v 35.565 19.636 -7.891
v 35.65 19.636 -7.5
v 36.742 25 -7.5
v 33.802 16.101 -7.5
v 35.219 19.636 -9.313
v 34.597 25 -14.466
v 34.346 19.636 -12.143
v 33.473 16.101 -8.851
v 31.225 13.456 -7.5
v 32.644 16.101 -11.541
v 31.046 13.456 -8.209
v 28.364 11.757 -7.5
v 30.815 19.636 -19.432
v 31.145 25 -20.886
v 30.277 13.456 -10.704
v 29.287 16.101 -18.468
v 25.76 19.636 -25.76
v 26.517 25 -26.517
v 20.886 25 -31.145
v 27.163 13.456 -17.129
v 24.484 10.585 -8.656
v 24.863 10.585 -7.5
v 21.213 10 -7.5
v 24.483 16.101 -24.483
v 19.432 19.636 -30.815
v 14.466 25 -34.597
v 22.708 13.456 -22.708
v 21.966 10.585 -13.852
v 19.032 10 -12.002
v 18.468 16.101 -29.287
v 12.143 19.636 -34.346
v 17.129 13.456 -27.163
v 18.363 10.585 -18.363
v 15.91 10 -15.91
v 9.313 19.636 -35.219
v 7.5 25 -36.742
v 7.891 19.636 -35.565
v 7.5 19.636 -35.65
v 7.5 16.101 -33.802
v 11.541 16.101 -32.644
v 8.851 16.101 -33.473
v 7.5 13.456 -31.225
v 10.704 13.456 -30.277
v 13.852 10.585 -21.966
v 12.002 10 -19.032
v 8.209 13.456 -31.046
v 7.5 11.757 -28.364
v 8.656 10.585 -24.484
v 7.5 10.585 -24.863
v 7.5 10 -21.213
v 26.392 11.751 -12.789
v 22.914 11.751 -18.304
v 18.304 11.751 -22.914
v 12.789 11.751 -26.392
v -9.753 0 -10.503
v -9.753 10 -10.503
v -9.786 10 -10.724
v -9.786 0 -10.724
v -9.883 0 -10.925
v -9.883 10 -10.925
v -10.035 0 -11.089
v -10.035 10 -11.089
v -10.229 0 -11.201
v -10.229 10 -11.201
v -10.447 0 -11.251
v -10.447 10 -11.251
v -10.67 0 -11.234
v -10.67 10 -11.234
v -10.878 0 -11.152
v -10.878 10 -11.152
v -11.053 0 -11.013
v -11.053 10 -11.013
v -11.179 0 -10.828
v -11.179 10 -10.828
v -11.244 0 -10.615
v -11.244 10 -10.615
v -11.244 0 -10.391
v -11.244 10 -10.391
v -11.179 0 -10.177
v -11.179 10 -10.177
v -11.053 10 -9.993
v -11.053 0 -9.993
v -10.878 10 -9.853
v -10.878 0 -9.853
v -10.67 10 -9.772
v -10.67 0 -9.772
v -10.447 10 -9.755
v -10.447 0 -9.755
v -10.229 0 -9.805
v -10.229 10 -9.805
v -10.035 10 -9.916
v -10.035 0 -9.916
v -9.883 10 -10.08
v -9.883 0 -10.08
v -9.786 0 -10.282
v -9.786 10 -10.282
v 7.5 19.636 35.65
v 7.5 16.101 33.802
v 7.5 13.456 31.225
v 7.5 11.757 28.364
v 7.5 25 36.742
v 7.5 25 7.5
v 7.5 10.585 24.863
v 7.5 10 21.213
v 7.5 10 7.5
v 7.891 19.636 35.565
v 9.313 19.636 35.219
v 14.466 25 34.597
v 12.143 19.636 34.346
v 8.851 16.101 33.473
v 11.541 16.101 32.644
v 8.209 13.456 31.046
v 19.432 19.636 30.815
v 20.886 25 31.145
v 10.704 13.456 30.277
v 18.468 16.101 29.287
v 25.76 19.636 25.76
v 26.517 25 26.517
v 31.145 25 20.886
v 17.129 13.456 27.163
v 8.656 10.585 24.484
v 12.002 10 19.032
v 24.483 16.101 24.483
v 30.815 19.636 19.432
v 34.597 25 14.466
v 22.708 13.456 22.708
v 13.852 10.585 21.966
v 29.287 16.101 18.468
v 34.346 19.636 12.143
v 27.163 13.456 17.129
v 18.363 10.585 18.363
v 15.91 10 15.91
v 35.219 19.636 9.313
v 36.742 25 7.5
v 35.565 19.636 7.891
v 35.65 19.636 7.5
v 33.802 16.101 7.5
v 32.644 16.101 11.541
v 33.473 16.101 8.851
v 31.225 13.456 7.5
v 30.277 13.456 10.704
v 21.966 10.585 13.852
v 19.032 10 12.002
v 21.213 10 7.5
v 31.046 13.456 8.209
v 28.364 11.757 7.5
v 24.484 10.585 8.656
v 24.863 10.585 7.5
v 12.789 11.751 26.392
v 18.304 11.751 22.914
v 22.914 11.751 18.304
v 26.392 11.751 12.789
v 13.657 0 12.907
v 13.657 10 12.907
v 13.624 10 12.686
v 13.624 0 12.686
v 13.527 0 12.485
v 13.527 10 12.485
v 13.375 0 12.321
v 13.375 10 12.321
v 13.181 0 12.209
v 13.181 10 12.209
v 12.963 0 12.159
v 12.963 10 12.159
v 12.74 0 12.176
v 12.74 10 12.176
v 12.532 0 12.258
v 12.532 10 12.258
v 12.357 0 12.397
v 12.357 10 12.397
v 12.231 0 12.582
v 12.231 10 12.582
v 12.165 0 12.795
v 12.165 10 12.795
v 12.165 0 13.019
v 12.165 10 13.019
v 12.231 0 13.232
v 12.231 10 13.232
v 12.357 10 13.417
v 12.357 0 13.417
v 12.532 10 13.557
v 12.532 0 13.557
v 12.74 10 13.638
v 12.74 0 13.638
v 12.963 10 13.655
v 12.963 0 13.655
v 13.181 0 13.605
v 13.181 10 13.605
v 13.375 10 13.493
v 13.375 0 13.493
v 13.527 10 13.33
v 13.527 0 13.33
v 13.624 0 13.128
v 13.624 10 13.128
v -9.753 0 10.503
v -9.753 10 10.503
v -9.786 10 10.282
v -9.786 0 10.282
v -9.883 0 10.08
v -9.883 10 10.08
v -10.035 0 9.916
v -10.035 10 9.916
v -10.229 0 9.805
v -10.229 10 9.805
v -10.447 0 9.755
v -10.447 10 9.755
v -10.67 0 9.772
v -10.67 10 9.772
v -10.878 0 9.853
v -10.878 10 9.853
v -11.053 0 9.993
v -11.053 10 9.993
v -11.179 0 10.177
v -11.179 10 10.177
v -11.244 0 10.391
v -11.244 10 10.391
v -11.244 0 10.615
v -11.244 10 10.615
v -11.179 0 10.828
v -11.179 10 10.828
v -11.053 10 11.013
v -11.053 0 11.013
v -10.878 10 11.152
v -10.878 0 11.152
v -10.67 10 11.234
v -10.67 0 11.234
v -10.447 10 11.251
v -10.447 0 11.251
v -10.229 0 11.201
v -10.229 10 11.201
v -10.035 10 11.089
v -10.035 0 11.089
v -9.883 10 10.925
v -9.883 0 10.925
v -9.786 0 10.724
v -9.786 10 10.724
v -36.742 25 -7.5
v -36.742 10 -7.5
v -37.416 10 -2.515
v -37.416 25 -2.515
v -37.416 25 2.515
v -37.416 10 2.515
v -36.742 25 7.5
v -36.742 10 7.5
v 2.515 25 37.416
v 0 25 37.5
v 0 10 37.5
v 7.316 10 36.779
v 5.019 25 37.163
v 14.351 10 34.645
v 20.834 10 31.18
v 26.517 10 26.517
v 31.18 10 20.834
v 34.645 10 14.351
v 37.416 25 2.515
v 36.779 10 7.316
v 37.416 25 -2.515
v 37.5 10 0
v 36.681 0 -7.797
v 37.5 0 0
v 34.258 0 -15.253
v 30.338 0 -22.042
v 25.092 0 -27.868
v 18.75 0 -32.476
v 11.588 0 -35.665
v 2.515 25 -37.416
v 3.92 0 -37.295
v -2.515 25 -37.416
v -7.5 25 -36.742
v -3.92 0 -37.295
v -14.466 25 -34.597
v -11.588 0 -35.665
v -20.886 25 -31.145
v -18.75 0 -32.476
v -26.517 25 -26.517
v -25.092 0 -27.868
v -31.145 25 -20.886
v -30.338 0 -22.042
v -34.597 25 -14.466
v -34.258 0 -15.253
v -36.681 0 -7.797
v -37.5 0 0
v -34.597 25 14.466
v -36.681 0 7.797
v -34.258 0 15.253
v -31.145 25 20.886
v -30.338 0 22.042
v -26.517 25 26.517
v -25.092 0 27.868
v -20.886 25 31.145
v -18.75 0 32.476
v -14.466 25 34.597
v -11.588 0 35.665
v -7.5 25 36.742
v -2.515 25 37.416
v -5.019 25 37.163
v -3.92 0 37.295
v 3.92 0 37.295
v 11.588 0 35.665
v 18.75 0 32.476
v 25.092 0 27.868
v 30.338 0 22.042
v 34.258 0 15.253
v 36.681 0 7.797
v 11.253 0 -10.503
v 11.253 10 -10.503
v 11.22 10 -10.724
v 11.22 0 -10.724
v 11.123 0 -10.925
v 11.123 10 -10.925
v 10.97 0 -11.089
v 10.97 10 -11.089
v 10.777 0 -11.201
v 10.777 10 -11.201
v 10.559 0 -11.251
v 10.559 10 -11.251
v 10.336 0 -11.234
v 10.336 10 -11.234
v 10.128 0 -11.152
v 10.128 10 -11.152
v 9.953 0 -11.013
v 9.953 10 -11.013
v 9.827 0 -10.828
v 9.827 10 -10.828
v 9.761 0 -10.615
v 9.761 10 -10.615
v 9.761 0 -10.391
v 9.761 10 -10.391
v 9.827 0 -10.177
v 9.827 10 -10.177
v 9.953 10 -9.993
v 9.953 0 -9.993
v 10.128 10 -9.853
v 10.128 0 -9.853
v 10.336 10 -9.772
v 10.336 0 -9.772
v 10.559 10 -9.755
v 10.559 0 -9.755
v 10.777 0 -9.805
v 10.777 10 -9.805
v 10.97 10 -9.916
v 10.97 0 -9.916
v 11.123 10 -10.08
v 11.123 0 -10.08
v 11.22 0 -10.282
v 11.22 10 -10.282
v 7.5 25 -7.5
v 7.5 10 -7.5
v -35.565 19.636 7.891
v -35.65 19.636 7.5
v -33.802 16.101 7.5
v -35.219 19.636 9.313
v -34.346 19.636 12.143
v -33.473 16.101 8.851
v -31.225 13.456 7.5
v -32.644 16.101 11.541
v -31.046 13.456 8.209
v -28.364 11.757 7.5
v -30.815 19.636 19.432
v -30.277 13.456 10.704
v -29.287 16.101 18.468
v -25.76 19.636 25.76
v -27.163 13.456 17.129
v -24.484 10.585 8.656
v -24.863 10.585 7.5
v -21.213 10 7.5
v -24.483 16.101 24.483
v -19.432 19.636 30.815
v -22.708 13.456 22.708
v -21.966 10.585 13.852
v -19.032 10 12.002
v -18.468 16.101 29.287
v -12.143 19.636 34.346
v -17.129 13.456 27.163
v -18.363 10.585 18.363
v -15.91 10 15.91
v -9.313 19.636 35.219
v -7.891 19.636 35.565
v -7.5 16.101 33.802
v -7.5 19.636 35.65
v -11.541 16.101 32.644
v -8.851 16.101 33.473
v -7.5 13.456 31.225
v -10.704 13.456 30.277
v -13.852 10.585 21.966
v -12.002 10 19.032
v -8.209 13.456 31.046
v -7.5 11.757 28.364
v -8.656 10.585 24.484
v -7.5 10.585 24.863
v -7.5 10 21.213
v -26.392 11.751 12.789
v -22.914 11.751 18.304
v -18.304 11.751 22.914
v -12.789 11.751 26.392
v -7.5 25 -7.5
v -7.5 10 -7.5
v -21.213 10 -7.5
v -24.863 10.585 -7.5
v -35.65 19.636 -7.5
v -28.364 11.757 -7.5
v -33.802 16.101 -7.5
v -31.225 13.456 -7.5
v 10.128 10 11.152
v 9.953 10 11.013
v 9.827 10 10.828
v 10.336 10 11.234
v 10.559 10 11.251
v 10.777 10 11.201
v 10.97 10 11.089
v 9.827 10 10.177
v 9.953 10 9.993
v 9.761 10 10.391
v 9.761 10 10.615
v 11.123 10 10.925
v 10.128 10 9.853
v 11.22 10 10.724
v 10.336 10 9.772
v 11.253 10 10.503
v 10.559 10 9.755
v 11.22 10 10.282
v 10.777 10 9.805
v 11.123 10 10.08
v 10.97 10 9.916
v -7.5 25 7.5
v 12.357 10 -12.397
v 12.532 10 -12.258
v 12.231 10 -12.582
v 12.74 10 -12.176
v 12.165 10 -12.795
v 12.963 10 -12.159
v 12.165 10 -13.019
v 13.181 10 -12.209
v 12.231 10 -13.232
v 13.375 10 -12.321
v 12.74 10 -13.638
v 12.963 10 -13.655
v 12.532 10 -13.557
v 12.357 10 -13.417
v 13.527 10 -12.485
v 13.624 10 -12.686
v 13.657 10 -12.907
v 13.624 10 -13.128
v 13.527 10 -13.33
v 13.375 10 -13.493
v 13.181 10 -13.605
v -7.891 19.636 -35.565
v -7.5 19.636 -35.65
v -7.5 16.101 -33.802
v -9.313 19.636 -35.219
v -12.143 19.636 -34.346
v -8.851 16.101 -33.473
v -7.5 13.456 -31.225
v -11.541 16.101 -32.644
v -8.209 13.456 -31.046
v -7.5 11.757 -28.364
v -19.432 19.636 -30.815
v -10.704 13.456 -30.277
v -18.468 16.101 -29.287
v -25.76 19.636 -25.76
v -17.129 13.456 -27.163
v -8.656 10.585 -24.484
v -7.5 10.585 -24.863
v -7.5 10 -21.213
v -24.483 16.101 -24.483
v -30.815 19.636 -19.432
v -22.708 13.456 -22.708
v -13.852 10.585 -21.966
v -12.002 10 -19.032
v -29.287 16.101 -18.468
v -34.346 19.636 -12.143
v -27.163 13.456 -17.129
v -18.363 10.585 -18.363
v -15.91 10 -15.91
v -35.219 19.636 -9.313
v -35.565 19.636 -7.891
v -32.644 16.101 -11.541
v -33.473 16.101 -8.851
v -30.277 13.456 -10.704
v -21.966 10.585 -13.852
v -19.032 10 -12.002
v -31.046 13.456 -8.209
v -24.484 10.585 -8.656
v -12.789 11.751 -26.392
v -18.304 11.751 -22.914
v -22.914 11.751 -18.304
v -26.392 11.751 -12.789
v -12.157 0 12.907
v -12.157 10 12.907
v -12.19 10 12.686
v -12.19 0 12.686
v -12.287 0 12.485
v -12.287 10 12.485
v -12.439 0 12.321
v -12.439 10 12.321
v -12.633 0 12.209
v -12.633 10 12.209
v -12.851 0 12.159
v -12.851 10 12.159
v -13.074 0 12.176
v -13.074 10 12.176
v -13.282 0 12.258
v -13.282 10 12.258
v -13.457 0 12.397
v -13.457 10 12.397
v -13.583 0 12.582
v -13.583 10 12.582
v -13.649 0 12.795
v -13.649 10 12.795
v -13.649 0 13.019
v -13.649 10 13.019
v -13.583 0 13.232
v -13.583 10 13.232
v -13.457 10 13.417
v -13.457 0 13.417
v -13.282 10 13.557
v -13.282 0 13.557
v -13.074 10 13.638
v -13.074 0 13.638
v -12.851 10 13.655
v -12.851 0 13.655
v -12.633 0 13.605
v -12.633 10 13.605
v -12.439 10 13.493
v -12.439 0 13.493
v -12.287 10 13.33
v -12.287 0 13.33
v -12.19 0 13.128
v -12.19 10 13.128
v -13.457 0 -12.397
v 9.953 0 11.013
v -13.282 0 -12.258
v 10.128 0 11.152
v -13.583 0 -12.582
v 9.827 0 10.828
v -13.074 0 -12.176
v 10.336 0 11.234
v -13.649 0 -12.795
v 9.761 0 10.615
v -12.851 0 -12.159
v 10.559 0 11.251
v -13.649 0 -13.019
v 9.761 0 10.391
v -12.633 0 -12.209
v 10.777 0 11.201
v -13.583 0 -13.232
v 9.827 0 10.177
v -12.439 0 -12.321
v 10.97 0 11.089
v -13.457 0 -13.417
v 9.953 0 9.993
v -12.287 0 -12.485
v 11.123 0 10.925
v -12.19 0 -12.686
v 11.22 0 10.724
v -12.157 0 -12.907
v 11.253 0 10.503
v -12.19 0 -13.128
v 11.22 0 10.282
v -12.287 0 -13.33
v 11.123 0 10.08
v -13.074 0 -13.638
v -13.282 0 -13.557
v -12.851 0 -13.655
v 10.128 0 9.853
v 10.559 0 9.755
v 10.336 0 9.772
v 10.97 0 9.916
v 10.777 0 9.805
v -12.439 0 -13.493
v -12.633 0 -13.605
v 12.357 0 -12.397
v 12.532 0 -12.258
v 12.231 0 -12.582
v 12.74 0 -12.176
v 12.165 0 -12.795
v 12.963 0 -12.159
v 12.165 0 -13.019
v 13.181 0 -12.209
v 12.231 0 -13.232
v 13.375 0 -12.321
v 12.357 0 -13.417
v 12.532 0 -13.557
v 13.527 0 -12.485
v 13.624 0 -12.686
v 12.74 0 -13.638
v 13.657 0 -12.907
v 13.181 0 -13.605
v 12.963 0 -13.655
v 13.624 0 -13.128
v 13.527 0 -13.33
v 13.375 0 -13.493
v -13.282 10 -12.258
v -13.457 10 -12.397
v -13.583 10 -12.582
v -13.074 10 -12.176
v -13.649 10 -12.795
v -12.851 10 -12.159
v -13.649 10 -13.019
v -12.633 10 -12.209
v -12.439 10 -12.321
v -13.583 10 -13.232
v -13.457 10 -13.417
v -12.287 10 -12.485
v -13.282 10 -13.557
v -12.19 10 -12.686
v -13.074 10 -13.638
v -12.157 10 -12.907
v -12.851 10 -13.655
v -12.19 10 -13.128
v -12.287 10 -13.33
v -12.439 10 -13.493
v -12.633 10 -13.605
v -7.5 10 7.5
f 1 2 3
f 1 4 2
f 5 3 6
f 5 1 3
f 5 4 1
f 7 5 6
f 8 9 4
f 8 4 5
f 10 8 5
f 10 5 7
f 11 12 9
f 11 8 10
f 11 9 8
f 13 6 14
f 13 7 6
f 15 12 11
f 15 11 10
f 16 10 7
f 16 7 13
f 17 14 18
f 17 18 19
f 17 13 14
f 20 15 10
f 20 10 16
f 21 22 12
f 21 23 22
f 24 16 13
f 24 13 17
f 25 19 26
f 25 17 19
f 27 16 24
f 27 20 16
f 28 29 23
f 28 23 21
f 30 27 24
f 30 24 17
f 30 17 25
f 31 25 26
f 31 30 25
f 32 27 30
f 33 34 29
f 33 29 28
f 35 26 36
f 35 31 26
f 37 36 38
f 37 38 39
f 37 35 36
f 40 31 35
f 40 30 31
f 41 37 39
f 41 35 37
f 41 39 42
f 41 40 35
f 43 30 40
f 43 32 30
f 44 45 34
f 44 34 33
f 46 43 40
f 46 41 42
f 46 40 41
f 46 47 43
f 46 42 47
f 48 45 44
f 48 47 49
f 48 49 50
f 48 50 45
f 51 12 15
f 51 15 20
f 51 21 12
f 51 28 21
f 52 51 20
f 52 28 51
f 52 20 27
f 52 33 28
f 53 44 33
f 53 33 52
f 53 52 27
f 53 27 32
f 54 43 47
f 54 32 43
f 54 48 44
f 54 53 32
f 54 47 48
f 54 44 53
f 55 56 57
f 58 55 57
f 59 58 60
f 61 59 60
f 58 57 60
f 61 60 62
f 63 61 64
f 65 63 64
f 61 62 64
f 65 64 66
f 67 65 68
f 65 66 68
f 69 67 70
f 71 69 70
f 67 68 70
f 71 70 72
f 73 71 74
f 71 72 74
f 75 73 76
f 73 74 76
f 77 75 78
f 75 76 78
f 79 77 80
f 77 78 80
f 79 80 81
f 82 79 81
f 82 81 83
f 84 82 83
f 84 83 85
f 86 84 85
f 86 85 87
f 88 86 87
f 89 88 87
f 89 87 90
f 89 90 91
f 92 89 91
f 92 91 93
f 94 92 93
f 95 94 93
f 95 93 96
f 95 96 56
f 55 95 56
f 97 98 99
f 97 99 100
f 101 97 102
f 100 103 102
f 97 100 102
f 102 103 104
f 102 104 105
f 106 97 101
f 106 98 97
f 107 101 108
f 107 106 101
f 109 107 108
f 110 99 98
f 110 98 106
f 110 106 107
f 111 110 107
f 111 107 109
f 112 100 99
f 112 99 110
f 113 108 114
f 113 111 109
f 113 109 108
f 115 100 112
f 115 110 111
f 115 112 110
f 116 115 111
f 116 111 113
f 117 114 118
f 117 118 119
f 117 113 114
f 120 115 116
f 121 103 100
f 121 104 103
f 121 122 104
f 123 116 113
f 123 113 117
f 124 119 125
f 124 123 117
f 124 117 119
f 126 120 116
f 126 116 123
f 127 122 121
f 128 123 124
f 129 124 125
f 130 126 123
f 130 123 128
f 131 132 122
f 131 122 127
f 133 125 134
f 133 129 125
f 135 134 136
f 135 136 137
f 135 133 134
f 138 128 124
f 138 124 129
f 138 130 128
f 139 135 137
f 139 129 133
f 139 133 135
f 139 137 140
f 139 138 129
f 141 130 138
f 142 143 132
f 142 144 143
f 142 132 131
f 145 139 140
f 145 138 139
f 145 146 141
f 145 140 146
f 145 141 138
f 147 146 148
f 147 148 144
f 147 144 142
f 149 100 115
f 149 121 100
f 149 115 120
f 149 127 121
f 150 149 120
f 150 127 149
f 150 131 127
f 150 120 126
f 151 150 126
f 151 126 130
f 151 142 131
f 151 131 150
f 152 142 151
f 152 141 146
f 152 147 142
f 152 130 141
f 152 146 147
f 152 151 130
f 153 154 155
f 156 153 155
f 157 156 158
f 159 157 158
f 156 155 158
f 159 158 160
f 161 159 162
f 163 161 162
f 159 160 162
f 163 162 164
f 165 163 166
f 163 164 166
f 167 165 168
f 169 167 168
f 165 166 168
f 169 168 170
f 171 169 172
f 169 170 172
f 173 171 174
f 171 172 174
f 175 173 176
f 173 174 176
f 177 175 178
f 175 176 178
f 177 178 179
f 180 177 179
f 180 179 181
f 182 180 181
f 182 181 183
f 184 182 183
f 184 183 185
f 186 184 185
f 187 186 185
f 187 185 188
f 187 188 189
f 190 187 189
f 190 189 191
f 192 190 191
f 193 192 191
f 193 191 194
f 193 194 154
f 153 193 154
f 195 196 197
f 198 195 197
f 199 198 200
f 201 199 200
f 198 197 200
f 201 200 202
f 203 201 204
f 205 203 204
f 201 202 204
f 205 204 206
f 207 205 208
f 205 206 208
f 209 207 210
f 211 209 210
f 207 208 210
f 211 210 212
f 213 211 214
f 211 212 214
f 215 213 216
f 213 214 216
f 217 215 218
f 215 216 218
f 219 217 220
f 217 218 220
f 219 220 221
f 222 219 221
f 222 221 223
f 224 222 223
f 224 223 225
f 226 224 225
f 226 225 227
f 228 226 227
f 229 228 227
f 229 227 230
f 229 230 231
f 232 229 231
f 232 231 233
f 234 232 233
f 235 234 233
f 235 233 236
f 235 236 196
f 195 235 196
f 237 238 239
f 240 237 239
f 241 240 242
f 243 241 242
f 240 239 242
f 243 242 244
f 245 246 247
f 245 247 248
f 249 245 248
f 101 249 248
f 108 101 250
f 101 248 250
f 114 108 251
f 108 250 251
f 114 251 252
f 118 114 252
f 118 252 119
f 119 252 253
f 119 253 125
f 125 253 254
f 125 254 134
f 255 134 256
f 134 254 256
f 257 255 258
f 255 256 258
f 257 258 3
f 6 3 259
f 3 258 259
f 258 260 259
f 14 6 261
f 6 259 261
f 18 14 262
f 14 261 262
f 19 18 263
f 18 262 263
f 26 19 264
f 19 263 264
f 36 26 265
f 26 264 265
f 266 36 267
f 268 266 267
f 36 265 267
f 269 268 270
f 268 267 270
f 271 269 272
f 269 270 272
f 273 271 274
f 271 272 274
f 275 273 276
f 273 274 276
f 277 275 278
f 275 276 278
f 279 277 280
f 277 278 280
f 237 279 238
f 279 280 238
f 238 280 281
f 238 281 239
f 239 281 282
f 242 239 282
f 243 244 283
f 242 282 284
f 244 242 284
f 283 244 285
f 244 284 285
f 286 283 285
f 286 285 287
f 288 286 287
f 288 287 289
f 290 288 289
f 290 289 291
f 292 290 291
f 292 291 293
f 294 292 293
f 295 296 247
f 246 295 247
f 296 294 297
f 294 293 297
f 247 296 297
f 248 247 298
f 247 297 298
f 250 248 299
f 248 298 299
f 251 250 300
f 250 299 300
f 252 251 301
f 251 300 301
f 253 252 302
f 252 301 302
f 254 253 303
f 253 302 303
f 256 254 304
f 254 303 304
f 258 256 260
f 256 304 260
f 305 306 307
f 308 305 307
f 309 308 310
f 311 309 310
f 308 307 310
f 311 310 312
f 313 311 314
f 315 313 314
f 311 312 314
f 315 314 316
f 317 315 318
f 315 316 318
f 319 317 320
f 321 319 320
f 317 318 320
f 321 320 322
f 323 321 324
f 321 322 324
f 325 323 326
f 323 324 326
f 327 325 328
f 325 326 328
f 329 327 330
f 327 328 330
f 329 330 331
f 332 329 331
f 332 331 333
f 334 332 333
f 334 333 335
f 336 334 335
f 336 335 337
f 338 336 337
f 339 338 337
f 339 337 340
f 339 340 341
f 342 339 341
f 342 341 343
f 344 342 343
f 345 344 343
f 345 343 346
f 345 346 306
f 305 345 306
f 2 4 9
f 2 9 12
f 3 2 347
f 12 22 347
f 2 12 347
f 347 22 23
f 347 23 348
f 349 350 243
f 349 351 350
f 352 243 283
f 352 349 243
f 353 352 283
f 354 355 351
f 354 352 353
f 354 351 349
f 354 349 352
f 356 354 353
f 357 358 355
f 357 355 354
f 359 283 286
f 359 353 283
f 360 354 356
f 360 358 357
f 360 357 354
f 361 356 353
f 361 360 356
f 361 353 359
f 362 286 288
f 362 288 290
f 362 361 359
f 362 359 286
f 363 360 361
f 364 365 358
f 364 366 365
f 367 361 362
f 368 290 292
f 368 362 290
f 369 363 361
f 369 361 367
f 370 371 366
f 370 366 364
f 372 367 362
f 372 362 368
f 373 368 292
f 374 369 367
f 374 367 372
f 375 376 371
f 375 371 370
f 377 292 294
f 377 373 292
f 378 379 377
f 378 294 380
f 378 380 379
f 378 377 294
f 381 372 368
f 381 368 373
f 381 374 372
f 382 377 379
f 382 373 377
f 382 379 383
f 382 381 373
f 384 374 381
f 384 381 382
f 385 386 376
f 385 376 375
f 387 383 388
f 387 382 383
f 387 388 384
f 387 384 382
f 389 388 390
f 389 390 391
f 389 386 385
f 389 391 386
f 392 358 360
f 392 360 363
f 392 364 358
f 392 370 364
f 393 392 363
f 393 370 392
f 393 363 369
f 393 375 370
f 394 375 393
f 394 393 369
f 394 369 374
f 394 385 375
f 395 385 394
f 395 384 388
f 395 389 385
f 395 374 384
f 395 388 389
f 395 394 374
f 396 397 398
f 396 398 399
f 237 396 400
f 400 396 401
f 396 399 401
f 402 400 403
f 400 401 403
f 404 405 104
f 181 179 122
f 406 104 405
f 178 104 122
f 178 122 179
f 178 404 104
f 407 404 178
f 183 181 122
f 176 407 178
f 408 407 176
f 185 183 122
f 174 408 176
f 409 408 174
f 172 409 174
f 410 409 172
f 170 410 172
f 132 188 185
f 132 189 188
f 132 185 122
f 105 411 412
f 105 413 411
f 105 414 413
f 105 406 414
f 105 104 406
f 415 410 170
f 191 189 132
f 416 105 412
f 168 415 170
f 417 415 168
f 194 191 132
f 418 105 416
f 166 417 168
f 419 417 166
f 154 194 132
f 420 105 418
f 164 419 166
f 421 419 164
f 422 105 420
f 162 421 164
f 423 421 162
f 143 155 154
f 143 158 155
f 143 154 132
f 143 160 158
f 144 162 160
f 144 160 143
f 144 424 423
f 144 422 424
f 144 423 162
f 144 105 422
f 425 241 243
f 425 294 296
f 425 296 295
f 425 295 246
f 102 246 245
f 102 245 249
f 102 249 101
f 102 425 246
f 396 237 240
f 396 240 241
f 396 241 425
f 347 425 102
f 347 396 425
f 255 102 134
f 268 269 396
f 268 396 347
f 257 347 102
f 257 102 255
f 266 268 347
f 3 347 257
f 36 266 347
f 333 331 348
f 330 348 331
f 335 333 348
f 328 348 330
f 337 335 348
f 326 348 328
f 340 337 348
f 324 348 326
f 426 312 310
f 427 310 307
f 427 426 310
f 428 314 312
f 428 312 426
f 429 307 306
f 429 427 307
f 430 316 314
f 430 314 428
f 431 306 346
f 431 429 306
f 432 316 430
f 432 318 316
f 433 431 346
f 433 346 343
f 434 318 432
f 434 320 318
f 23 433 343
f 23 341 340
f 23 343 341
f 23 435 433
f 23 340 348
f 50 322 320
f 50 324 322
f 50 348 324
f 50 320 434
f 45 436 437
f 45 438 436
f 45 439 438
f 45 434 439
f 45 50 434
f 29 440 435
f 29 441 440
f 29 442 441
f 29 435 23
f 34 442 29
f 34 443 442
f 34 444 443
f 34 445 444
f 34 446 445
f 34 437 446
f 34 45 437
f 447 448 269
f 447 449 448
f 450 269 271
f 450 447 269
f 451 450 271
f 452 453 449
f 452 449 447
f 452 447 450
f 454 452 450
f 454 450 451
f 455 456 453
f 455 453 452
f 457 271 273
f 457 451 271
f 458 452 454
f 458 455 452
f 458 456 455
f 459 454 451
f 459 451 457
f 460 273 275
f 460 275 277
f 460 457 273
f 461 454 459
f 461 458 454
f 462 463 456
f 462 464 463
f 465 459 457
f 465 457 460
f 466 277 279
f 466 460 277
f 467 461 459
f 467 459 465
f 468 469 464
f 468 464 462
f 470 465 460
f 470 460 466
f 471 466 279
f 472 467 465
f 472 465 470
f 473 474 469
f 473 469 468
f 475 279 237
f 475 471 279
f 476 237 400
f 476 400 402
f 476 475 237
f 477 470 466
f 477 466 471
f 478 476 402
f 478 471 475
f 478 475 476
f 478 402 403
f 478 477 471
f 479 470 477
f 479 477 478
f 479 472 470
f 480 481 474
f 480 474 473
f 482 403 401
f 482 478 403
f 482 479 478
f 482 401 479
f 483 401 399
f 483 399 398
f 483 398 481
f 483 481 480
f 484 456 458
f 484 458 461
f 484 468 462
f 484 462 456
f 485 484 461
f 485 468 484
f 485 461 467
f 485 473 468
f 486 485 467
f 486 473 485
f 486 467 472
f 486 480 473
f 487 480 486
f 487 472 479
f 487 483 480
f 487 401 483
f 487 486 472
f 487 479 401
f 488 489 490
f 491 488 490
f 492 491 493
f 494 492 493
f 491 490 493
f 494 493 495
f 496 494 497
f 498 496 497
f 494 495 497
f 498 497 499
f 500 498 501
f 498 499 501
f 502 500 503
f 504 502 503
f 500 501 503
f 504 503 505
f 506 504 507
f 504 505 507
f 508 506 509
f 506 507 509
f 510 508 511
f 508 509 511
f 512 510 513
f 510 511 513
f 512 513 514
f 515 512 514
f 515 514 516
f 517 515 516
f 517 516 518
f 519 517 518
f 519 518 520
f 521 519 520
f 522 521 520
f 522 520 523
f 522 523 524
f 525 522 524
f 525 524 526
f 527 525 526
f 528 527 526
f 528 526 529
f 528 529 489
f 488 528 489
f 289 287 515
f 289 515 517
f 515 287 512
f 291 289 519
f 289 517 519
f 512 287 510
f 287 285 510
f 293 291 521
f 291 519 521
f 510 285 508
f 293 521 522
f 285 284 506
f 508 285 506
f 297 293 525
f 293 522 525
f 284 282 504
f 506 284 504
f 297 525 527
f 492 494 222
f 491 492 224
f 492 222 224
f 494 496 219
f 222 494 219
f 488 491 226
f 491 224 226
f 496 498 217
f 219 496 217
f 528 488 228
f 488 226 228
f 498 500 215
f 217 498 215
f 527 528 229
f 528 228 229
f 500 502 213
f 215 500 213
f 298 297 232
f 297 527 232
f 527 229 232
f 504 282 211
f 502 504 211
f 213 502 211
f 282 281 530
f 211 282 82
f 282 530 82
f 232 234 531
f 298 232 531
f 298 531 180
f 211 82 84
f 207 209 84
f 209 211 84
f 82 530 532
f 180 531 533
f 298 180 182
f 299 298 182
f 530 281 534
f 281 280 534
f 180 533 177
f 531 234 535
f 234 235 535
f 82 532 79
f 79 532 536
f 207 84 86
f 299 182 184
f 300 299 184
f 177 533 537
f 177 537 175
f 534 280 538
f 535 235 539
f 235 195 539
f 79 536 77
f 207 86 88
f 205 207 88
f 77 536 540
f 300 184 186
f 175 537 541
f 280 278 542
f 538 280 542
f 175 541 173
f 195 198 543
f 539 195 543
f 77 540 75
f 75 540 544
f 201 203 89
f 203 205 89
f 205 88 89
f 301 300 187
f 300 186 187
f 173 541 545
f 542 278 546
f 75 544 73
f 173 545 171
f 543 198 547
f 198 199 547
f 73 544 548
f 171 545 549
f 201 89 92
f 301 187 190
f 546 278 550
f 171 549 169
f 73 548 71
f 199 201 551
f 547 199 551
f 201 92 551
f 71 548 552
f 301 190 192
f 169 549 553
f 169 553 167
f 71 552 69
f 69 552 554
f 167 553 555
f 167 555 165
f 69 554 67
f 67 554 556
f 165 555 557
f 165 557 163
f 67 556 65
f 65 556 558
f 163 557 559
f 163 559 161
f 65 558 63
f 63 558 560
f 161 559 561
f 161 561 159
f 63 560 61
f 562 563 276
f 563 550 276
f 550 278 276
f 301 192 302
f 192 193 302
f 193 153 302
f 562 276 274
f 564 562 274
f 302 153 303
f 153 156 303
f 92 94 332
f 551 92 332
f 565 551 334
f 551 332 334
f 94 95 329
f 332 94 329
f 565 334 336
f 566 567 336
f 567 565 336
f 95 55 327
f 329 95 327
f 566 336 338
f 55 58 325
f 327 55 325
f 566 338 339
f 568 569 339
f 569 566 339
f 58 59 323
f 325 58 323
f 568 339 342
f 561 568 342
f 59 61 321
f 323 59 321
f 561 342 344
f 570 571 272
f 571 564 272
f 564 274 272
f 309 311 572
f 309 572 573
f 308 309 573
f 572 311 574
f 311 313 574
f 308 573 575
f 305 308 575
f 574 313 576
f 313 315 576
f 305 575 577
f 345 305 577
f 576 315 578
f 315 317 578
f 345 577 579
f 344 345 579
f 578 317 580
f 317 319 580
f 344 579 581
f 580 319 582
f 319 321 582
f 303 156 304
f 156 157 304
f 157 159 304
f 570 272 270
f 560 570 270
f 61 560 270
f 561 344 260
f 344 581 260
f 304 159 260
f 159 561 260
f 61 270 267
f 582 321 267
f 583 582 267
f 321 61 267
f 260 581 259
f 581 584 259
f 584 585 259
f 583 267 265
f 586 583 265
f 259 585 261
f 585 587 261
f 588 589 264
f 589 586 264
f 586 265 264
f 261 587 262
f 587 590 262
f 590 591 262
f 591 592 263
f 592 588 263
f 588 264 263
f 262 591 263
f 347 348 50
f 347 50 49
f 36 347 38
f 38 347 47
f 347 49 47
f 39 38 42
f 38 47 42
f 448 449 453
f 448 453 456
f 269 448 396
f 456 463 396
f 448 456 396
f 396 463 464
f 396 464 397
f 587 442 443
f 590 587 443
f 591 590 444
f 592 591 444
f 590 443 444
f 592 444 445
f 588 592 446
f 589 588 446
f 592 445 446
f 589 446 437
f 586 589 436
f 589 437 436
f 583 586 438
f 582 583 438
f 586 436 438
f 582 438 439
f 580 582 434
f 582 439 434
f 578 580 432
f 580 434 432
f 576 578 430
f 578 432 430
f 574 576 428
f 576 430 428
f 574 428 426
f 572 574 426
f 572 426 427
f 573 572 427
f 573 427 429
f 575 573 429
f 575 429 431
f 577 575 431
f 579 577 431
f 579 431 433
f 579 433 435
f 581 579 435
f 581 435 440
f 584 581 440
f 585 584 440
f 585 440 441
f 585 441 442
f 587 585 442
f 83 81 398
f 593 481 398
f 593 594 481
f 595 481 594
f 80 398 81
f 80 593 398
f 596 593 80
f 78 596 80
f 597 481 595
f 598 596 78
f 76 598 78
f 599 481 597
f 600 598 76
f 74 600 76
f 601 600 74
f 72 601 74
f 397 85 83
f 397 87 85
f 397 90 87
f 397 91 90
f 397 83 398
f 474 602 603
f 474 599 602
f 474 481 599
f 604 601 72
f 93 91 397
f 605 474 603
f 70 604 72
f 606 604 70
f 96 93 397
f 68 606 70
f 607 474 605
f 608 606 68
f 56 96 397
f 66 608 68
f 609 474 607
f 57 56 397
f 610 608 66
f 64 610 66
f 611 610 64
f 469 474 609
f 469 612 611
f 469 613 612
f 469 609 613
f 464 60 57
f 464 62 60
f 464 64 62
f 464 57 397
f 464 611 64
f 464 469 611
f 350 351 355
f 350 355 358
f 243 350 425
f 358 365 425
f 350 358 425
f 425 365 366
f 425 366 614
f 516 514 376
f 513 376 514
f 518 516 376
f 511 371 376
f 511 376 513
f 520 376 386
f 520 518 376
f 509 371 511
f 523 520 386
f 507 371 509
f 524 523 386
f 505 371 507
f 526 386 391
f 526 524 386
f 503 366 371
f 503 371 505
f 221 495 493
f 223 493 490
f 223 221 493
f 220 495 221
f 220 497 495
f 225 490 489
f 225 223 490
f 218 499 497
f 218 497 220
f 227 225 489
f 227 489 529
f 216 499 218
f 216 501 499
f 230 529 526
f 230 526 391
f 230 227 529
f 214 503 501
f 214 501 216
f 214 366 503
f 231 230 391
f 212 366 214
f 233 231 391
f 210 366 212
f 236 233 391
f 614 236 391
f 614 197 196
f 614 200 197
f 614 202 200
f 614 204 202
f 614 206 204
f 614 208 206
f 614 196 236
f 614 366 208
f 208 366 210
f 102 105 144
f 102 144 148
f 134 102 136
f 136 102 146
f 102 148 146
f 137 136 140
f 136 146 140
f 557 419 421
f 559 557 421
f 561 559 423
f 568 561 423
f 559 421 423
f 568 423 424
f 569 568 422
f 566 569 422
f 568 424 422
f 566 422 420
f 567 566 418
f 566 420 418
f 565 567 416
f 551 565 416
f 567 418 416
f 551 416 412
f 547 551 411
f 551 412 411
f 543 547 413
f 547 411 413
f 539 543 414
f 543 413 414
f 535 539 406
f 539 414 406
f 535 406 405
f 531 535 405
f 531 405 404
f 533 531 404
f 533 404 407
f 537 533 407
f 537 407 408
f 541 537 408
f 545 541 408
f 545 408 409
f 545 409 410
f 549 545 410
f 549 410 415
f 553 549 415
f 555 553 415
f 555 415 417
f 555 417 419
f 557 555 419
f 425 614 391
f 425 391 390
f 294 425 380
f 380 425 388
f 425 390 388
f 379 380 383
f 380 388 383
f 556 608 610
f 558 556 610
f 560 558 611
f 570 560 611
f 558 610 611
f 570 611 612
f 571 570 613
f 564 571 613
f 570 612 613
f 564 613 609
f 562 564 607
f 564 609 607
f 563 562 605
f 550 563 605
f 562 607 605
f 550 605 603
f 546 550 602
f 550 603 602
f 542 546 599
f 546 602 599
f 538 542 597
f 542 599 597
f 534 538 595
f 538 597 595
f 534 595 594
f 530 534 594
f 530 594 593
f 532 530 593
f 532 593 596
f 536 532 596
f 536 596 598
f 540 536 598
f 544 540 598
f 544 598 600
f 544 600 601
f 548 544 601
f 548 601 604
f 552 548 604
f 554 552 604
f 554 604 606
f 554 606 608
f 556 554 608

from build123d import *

# Parameters (mm, degrees)
SKETCH1_R           = 37.5
BOSS_EXTRUDE1_DEPTH = 10
BOSS_EXTRUDE2_DEPTH = 15
SKETCH8_R           = 0.75
CUT_EXTRUDE1_DEPTH  = 11


with BuildPart() as part:
    # Sketch1 → Boss-Extrude1 (new body)
    with BuildSketch(Plane(origin=(0, 0, 0), x_dir=(1, 0, 0), z_dir=(0, 1, 0))):
        Circle(SKETCH1_R)
    extrude(amount=BOSS_EXTRUDE1_DEPTH)

    # Sketch5 → Revolve1 (revolve)
    with BuildSketch(Plane(origin=(0, 0, 0), x_dir=(0, 0, -1), z_dir=(1, 0, 0))):
        with BuildLine():
            Line((-37.5, 25), (-37.5, 10))
            Line((-37.5, 10), (-22.5, 10))
            add(Edge.make_bspline(
                [(-37.5, 25), (-36.468402779, 11.405172281), (-22.5, 10)],
                knots=[0, 0, 0, 1, 1, 1], degree=2))
        make_face()
    revolve(axis=Axis((0, 0, 0), (0, 1, 0)))

    # Sketch7 → Boss-Extrude2 (add)
    with BuildSketch(Plane(origin=(0, 10, 0), x_dir=(1, 0, 0), z_dir=(0, 1, 0))):
        with BuildLine():
            Line((36.742346142, 7.5), (7.5, 7.5))
            Line((7.5, 7.5), (7.5, 36.742346142))
            ThreePointArc((7.5, 36.742346142), (0, 37.5), (-7.5, 36.742346142))
            Line((-7.5, 36.742346142), (-7.5, 7.5))
            Line((-7.5, 7.5), (-36.742346142, 7.5))
            ThreePointArc((-36.742346142, 7.5), (-37.5, 0), (-36.742346142, -7.5))
            Line((-36.742346142, -7.5), (-7.5, -7.5))
            Line((-7.5, -7.5), (-7.5, -36.742346142))
            ThreePointArc((-7.5, -36.742346142), (0, -37.5), (7.5, -36.742346142))
            Line((7.5, -36.742346142), (7.5, -7.5))
            Line((7.5, -7.5), (36.742346142, -7.5))
            ThreePointArc((36.742346142, -7.5), (37.5, 0), (36.742346142, 7.5))
        make_face()
    extrude(amount=BOSS_EXTRUDE2_DEPTH)

    # Sketch8 → Cut-Extrude1 (cut, through all)
    with BuildSketch(Plane(origin=(0, 10, 0), x_dir=(1, 0, 0), z_dir=(0, 1, 0))):
        with Locations((-10.50286976, 10.50286976)):
            Circle(SKETCH8_R)
        with Locations((-12.907032816, 12.907032816)):
            Circle(SKETCH8_R)
        with Locations((10.50286976, 10.50286976)):
            Circle(SKETCH8_R)
        with Locations((12.907032816, 12.907032816)):
            Circle(SKETCH8_R)
        with Locations((10.50286976, -10.50286976)):
            Circle(SKETCH8_R)
        with Locations((12.907032816, -12.907032816)):
            Circle(SKETCH8_R)
        with Locations((-10.50286976, -10.50286976)):
            Circle(SKETCH8_R)
        with Locations((-12.907032816, -12.907032816)):
            Circle(SKETCH8_R)
    extrude(amount=-CUT_EXTRUDE1_DEPTH, mode=Mode.SUBTRACT)


solid = part.part
